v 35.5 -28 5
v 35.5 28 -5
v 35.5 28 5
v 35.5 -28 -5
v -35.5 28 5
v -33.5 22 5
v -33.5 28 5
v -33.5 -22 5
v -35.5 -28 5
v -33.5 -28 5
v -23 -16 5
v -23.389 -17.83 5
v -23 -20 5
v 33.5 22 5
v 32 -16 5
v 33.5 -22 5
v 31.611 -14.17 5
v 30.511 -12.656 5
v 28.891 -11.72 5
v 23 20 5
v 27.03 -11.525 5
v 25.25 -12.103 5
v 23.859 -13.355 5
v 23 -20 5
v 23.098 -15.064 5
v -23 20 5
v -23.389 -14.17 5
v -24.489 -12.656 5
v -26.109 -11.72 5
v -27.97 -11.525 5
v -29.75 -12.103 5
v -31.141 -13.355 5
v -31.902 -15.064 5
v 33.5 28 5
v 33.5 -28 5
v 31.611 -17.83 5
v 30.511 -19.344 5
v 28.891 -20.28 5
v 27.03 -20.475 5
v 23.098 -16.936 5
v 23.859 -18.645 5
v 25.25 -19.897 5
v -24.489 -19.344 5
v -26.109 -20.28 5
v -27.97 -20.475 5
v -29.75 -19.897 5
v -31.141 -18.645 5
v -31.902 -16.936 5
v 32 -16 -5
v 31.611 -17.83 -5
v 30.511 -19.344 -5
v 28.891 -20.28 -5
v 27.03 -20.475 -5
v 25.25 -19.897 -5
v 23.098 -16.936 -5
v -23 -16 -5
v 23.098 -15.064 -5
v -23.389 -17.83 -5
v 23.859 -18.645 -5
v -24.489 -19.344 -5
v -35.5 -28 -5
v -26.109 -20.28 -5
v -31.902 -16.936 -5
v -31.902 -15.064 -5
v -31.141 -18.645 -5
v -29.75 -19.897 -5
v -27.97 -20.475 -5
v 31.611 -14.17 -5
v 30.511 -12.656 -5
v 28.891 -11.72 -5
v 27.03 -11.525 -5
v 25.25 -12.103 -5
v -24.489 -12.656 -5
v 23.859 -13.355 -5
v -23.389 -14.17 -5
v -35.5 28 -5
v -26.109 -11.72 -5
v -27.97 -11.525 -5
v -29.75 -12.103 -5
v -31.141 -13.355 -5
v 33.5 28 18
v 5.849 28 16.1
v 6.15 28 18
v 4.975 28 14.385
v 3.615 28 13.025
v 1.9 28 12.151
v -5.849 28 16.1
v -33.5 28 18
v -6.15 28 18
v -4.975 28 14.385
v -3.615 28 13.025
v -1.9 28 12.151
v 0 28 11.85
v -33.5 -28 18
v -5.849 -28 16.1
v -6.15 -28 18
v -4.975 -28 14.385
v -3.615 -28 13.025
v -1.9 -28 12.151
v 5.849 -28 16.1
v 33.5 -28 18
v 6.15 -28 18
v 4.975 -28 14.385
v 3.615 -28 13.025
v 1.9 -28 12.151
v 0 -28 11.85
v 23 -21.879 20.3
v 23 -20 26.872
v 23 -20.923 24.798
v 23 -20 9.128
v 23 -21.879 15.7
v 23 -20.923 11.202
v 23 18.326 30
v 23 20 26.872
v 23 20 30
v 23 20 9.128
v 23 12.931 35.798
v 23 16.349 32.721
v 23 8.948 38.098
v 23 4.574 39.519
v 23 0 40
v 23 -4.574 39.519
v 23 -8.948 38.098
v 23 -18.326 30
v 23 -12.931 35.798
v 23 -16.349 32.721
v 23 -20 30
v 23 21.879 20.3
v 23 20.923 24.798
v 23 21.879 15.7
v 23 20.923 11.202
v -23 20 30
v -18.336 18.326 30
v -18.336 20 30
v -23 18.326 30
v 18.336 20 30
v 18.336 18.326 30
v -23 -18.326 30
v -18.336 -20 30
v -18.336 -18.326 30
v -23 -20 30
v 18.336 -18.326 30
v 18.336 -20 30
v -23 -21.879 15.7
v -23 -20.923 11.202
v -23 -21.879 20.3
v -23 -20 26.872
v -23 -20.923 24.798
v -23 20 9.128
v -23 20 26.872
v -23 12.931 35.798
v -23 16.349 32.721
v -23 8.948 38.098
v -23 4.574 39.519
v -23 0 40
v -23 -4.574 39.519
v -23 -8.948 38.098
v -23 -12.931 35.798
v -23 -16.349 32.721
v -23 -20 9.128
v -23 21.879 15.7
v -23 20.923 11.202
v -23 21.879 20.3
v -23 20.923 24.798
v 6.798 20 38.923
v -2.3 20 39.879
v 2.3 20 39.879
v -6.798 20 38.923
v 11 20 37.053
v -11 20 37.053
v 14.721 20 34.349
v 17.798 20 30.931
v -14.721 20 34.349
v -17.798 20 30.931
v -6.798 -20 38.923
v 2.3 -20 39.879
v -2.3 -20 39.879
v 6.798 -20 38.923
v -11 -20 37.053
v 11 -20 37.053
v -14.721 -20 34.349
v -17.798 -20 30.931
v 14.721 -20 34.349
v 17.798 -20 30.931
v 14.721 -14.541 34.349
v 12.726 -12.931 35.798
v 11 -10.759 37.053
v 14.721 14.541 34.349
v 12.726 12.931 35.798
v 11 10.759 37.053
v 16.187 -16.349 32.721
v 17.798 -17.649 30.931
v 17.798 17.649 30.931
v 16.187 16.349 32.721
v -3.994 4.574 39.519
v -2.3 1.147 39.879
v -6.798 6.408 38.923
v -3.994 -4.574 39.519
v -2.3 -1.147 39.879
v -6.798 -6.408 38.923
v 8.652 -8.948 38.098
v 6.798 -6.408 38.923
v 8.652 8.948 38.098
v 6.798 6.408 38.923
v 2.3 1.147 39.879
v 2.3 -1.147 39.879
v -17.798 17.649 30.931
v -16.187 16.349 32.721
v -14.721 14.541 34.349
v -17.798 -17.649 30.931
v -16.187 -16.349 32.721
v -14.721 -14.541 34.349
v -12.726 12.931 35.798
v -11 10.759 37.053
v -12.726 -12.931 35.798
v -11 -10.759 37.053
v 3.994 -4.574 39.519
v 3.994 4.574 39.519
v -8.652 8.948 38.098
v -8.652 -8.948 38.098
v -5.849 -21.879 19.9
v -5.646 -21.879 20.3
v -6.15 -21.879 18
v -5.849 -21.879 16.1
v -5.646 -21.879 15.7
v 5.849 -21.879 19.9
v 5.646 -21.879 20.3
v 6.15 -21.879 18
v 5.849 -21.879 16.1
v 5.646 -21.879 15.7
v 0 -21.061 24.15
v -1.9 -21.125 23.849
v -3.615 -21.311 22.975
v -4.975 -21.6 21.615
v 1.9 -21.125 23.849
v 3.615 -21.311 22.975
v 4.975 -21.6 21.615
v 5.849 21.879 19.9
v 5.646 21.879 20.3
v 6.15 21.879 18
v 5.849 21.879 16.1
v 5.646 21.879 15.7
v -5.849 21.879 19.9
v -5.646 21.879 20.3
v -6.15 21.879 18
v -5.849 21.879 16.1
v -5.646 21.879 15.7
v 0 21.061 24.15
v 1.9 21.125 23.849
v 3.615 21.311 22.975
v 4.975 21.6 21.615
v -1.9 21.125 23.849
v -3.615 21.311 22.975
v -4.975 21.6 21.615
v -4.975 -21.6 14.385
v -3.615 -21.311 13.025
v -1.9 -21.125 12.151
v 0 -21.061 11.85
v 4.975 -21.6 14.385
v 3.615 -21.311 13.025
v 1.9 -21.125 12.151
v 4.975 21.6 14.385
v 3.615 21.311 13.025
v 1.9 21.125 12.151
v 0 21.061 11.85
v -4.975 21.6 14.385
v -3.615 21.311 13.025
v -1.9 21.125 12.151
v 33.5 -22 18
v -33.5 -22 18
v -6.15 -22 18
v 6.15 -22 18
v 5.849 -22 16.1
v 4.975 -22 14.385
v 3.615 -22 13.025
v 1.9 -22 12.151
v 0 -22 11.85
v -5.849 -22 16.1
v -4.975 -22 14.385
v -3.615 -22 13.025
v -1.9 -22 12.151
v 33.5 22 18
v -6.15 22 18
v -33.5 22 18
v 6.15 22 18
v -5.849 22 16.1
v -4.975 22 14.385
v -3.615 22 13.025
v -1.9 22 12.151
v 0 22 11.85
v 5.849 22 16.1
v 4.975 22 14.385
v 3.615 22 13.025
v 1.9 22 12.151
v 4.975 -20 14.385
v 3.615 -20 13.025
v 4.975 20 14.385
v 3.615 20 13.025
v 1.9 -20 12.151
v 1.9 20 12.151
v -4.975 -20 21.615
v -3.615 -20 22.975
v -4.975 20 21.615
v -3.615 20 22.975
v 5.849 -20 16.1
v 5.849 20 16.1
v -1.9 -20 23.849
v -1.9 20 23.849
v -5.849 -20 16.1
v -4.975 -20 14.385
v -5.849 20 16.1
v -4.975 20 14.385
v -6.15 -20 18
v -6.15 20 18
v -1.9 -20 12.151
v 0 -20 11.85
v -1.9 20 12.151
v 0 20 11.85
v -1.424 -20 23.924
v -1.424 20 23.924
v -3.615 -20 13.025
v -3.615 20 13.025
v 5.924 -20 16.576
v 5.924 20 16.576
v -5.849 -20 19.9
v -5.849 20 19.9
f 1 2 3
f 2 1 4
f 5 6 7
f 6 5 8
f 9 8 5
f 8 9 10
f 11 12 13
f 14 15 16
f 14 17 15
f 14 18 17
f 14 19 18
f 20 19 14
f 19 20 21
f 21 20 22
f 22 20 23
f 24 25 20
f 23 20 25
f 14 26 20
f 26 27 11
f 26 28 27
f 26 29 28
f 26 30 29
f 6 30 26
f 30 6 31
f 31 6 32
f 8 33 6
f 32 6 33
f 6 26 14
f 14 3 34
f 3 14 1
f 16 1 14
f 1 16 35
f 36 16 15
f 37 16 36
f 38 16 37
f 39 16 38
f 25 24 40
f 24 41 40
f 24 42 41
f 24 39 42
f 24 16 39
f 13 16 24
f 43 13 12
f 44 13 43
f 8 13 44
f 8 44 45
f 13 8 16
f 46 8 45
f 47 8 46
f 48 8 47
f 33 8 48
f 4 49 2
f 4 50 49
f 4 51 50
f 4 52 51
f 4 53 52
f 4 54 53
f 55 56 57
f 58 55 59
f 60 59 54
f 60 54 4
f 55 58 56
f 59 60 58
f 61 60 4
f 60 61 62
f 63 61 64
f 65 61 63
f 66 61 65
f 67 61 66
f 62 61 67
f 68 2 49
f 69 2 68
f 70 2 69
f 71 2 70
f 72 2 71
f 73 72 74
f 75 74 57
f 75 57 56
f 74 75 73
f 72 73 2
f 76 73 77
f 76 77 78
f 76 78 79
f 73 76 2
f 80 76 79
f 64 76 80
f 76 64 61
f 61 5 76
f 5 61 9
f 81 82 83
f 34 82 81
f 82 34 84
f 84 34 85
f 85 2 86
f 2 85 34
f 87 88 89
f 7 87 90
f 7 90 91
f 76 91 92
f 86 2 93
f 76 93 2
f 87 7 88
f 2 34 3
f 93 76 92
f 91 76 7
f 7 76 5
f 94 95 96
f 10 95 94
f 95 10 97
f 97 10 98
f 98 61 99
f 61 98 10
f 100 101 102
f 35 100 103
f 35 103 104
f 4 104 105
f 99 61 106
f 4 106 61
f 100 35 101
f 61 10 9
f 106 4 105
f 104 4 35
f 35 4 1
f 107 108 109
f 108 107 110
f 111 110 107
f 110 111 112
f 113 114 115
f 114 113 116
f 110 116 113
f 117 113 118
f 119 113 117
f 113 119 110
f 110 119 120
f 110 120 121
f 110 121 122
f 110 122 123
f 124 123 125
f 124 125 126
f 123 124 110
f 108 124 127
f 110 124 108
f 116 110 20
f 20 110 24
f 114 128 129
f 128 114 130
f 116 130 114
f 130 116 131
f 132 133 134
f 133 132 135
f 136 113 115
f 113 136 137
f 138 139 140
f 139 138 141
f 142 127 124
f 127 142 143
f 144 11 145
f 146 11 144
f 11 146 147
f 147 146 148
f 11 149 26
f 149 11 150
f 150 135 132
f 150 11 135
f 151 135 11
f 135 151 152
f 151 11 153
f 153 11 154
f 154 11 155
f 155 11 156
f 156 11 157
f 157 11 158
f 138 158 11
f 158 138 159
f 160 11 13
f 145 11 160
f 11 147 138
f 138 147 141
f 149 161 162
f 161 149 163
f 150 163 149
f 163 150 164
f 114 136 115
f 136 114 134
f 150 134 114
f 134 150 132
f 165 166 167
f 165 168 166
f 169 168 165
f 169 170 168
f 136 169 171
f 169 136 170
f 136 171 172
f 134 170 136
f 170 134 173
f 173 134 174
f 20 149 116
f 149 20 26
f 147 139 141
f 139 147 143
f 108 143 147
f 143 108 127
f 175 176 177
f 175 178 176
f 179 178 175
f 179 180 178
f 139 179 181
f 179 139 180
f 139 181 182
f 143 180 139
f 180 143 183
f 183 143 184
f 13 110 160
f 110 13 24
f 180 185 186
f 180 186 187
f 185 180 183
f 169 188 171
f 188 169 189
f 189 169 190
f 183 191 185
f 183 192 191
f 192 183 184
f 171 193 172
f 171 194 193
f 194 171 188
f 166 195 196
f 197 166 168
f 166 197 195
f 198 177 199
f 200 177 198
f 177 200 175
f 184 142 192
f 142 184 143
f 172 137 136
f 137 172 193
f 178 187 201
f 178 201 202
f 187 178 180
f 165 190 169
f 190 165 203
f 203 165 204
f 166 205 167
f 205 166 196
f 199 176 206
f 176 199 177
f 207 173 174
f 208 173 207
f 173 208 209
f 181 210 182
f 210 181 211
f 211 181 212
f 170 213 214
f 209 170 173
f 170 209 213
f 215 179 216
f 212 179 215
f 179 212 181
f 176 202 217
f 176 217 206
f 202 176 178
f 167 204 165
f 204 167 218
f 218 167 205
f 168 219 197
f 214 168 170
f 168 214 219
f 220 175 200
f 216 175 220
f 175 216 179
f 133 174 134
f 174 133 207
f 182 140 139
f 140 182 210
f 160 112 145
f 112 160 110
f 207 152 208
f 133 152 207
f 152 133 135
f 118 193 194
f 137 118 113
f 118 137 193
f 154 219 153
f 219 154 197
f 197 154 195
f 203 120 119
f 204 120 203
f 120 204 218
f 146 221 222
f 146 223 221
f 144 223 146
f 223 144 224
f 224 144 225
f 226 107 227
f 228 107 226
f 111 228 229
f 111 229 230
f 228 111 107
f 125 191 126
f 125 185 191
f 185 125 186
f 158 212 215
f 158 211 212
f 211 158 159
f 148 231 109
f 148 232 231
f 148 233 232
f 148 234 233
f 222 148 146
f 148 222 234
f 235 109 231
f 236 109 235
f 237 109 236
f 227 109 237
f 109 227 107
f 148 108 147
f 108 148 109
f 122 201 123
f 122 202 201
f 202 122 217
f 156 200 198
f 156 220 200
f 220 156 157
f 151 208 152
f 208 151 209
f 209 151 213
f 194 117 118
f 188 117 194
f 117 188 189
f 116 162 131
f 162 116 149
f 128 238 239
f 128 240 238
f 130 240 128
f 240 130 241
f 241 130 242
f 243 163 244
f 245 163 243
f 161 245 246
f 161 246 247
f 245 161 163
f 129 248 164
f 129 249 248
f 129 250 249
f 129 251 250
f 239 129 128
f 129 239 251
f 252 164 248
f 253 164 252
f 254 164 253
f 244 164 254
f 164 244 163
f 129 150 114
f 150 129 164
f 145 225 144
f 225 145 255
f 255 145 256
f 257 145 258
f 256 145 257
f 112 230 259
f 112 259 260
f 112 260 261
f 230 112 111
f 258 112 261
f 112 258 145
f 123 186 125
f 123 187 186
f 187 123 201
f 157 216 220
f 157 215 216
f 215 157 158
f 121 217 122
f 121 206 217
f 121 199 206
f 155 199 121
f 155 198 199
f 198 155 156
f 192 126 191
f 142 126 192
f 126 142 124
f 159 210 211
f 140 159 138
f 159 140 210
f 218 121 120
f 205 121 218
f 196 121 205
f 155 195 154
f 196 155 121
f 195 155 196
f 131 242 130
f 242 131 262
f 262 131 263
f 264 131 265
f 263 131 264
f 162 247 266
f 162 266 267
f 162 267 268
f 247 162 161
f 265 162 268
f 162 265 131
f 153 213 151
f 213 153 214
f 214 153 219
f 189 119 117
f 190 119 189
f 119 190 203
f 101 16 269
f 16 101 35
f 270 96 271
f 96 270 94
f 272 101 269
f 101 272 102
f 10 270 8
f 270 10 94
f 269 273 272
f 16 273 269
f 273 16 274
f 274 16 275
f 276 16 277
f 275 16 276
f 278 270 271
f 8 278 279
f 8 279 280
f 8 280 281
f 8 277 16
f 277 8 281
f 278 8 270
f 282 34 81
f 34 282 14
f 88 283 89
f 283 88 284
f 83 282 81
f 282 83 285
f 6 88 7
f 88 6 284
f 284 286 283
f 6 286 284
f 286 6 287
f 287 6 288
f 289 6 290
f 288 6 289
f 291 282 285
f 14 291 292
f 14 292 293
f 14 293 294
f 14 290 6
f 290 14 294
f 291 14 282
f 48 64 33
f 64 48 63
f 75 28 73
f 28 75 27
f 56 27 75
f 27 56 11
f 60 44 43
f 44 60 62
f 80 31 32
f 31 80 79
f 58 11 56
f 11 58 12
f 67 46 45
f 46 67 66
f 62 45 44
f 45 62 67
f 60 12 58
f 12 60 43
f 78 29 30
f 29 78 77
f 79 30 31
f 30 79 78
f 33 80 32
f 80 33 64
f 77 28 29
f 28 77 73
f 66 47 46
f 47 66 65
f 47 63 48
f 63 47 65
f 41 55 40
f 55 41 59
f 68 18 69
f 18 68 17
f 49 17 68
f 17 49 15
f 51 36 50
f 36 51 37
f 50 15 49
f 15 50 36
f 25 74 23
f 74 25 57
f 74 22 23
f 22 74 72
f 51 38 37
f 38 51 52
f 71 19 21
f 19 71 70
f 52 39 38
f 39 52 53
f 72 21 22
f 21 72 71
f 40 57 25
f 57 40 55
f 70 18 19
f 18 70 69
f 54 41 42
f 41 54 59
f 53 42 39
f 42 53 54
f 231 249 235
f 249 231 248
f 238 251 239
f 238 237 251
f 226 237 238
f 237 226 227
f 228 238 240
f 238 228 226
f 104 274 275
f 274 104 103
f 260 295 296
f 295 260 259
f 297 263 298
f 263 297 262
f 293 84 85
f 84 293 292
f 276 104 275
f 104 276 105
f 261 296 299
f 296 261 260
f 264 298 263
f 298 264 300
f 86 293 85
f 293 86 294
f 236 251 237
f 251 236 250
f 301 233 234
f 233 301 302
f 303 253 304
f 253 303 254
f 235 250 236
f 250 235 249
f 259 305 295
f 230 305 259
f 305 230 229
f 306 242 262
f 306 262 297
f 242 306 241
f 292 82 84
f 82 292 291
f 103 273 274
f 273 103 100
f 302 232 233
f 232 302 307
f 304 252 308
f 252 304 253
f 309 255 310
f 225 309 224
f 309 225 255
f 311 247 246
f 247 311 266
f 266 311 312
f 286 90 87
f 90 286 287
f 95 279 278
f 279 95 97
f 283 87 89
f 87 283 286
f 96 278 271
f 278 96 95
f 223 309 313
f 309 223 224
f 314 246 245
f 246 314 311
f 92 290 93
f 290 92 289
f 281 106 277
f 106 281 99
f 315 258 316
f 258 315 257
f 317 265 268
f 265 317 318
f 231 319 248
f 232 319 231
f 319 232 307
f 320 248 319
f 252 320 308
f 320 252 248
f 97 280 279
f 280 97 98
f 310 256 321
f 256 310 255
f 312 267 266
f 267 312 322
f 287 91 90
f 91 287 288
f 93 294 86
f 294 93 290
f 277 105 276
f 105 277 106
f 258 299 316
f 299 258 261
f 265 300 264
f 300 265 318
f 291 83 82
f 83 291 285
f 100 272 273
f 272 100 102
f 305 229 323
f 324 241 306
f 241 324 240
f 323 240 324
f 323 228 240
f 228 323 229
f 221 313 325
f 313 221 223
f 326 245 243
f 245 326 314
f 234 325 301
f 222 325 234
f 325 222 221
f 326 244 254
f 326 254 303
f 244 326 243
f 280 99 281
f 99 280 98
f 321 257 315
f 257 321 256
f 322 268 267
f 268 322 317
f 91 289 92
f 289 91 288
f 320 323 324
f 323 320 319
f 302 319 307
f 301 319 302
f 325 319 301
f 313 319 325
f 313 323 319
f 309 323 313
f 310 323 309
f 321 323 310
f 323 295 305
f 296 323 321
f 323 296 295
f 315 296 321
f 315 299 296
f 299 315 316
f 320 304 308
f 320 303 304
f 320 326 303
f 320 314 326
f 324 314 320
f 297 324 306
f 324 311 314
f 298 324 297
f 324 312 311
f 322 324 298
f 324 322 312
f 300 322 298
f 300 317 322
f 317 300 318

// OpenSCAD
// Parameters
shaft_diameter_mm = 12; //[6:24:0.5]
base_length_mm = 71; //[35.5:142:0.5]
base_width_mm = 56; //[28:112:0.5]
mounting_hole_diameter_mm = 9; //[5:14:0.5]
mounting_hole_center_distance_mm = 55; //[35:90:0.5]
base_thickness_mm = 10; //[5:20:0.5]
overall_height_mm = 36; //[20:72:0.5]
bearing_outer_diameter_mm = 32; //[20:60:0.5]
bearing_width_mm = 12; //[6:30:0.5]
fillet_radius_mm = 2; //[0.5:6:0.5]
housing_wall_mm = 6; //[3:15:0.5]
housing_length_mm = 46; //[30:80:0.5]
housing_width_mm = 40; //[25:80:0.5]
rib_thickness_mm = 6; //[3:15:0.5]
rib_height_mm = 14; //[6:30:0.5]
hole_edge_margin_y_mm = 12; //[6:25:0.5]
overlap_mm = 1; //[0.5:2:0.1]
bore_clearance_mm = 0.3; //[0:1:0.05]

// Right Trapezoid
module right_trapezoid() {
  color("Silver") {
    translate([-housing_length_mm/2 + (housing_length_mm/4), 0, base_thickness_mm/2 + rib_height_mm/2 - overlap_mm])
    rotate([90, 0, 0])
    linear_extrude(height=housing_width_mm, center=true) {
      polygon(points=[
        [0, 0],
        [housing_length_mm/2, 0],
        [housing_length_mm/2 - rib_height_mm, rib_height_mm],
        [0, rib_height_mm]
      ]);
    }
  }
}

// KP Pillow Block
module kp_pillow_block() {
  color("DimGray") {
    // Base
    translate([0, 0, 0])
    cube([base_length_mm, base_width_mm, base_thickness_mm], center=true);

    // Pillow Block Body
    translate([0, 0, base_thickness_mm/2 + (overall_height_mm - base_thickness_mm)/2 - overlap_mm])
    cube([housing_length_mm, housing_width_mm, overall_height_mm - base_thickness_mm], center=true);

    // Bearing Seat Geometry
    translate([0, 0, base_thickness_mm/2 + (overall_height_mm - base_thickness_mm)/2])
    rotate([90, 0, 0])
    cylinder(r=(bearing_outer_diameter_mm/2) + housing_wall_mm, h=housing_width_mm, center=true);

    // Housing Top Profile
    translate([0, 0, base_thickness_mm/2 + (overall_height_mm - base_thickness_mm)/2])
    rotate([0, 90, 0])
    cylinder(r=(bearing_outer_diameter_mm/2) + housing_wall_mm, h=housing_length_mm, center=true);

    // Ribs
    translate([0, -base_width_mm/2 + rib_thickness_mm/2, base_thickness_mm/2 + rib_height_mm/2 - overlap_mm])
    cube([base_length_mm - 2*fillet_radius_mm, rib_thickness_mm, rib_height_mm], center=true);

    translate([0, base_width_mm/2 - rib_thickness_mm/2, base_thickness_mm/2 + rib_height_mm/2 - overlap_mm])
    cube([base_length_mm - 2*fillet_radius_mm, rib_thickness_mm, rib_height_mm], center=true);
  }
}

// KP Pillow Block Hole Positions
module kp_pillow_block_hole_positions() {
  color("Black") {
    // Mounting Holes
    translate([-mounting_hole_center_distance_mm/2, -base_width_mm/2 + hole_edge_margin_y_mm, 0])
    cylinder(r=mounting_hole_diameter_mm/2, h=base_thickness_mm + 2*overlap_mm, center=true);

    translate([mounting_hole_center_distance_mm/2, -base_width_mm/2 + hole_edge_margin_y_mm, 0])
    cylinder(r=mounting_hole_diameter_mm/2, h=base_thickness_mm + 2*overlap_mm, center=true);
  }
}

// KP Pillow Block Assembly
module kp_pillow_block_assembly() {
  difference() {
    kp_pillow_block();
    kp_pillow_block_hole_positions();
    // Bearing Bore
    translate([0, 0, base_thickness_mm/2 + (overall_height_mm - base_thickness_mm)/2])
    rotate([90, 0, 0])
    cylinder(r=(shaft_diameter_mm + bore_clearance_mm)/2, h=base_width_mm + 2*(housing_wall_mm + overlap_mm), center=true);
  }
}

// SBR Bearing Block Assembly
module sbr_bearing_block_assembly() {
  union() {
    kp_pillow_block_assembly();
    right_trapezoid();
  }
}

// Final Assembly
module assembly() {
  sbr_bearing_block_assembly();
}

assembly();
